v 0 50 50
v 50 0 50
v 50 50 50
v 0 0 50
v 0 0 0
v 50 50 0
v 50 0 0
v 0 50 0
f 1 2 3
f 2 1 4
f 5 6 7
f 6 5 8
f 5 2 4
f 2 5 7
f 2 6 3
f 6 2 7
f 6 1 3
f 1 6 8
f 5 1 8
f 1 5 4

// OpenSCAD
module divide_cube_into_tetrahedra(cube_size, alpha=0.5, colors=[
    [1, 0, 0, alpha],  // red
    [0, 1, 0, alpha],  // green
    [0, 0, 1, alpha],  // blue
    [1, 1, 0, alpha],  // yellow
    [1, 0, 1, alpha],  // magenta
    [0, 1, 1, alpha]   // cyan
]) {
    // Define the vertices of the cube
    cube_vertices = [
        [0, 0, 0],
        [cube_size, 0, 0],
        [cube_size, cube_size, 0],
        [0, cube_size, 0],
        [0, 0, cube_size],
        [cube_size, 0, cube_size],
        [0, cube_size, cube_size],
        [cube_size, cube_size, cube_size],
    ];

    tetrahedron_indices = [
        [0, 4, 6, 7],
        [0, 3, 6, 7],
        [0, 4, 5, 7],
        [0, 1, 5, 7],
        [0, 3, 2, 7],
        [0, 1, 2, 7],
    ];

    // Define the tetrahedra by selecting vertices from the cube
    for (i = [0:5]) {
        // Define the indices of the vertices for the tetrahedron
        vertex_indices = tetrahedron_indices[i];

        // Define the vertices of the tetrahedron
        tetrahedron_vertices = [
            cube_vertices[vertex_indices[0]],
            cube_vertices[vertex_indices[1]],
            cube_vertices[vertex_indices[2]],
            cube_vertices[vertex_indices[3]]
        ];

        // Color the tetrahedron with the specified color
        color(colors[i]) polyhedron(points=tetrahedron_vertices, faces=[[0, 1, 2], [0, 2, 3], [0, 3, 1], [1, 2, 3]]);
    }

    // Draw the cube
    color([1, 1, 1, 0]) cube(cube_size);
}

// Example usage of the module
cube_size = 50;
alpha = 0.5;
colors = [
    [1, 0, 0, alpha],  // red
    [0, 1, 0, alpha],  // green
    [0, 0, 1, alpha],  // blue
    [1, 1, 0, alpha],  // yellow
    [1, 0, 1, alpha],  // magenta
    [0, 1, 1, alpha]   // cyan
];

divide_cube_into_tetrahedra(cube_size, alpha, colors);
